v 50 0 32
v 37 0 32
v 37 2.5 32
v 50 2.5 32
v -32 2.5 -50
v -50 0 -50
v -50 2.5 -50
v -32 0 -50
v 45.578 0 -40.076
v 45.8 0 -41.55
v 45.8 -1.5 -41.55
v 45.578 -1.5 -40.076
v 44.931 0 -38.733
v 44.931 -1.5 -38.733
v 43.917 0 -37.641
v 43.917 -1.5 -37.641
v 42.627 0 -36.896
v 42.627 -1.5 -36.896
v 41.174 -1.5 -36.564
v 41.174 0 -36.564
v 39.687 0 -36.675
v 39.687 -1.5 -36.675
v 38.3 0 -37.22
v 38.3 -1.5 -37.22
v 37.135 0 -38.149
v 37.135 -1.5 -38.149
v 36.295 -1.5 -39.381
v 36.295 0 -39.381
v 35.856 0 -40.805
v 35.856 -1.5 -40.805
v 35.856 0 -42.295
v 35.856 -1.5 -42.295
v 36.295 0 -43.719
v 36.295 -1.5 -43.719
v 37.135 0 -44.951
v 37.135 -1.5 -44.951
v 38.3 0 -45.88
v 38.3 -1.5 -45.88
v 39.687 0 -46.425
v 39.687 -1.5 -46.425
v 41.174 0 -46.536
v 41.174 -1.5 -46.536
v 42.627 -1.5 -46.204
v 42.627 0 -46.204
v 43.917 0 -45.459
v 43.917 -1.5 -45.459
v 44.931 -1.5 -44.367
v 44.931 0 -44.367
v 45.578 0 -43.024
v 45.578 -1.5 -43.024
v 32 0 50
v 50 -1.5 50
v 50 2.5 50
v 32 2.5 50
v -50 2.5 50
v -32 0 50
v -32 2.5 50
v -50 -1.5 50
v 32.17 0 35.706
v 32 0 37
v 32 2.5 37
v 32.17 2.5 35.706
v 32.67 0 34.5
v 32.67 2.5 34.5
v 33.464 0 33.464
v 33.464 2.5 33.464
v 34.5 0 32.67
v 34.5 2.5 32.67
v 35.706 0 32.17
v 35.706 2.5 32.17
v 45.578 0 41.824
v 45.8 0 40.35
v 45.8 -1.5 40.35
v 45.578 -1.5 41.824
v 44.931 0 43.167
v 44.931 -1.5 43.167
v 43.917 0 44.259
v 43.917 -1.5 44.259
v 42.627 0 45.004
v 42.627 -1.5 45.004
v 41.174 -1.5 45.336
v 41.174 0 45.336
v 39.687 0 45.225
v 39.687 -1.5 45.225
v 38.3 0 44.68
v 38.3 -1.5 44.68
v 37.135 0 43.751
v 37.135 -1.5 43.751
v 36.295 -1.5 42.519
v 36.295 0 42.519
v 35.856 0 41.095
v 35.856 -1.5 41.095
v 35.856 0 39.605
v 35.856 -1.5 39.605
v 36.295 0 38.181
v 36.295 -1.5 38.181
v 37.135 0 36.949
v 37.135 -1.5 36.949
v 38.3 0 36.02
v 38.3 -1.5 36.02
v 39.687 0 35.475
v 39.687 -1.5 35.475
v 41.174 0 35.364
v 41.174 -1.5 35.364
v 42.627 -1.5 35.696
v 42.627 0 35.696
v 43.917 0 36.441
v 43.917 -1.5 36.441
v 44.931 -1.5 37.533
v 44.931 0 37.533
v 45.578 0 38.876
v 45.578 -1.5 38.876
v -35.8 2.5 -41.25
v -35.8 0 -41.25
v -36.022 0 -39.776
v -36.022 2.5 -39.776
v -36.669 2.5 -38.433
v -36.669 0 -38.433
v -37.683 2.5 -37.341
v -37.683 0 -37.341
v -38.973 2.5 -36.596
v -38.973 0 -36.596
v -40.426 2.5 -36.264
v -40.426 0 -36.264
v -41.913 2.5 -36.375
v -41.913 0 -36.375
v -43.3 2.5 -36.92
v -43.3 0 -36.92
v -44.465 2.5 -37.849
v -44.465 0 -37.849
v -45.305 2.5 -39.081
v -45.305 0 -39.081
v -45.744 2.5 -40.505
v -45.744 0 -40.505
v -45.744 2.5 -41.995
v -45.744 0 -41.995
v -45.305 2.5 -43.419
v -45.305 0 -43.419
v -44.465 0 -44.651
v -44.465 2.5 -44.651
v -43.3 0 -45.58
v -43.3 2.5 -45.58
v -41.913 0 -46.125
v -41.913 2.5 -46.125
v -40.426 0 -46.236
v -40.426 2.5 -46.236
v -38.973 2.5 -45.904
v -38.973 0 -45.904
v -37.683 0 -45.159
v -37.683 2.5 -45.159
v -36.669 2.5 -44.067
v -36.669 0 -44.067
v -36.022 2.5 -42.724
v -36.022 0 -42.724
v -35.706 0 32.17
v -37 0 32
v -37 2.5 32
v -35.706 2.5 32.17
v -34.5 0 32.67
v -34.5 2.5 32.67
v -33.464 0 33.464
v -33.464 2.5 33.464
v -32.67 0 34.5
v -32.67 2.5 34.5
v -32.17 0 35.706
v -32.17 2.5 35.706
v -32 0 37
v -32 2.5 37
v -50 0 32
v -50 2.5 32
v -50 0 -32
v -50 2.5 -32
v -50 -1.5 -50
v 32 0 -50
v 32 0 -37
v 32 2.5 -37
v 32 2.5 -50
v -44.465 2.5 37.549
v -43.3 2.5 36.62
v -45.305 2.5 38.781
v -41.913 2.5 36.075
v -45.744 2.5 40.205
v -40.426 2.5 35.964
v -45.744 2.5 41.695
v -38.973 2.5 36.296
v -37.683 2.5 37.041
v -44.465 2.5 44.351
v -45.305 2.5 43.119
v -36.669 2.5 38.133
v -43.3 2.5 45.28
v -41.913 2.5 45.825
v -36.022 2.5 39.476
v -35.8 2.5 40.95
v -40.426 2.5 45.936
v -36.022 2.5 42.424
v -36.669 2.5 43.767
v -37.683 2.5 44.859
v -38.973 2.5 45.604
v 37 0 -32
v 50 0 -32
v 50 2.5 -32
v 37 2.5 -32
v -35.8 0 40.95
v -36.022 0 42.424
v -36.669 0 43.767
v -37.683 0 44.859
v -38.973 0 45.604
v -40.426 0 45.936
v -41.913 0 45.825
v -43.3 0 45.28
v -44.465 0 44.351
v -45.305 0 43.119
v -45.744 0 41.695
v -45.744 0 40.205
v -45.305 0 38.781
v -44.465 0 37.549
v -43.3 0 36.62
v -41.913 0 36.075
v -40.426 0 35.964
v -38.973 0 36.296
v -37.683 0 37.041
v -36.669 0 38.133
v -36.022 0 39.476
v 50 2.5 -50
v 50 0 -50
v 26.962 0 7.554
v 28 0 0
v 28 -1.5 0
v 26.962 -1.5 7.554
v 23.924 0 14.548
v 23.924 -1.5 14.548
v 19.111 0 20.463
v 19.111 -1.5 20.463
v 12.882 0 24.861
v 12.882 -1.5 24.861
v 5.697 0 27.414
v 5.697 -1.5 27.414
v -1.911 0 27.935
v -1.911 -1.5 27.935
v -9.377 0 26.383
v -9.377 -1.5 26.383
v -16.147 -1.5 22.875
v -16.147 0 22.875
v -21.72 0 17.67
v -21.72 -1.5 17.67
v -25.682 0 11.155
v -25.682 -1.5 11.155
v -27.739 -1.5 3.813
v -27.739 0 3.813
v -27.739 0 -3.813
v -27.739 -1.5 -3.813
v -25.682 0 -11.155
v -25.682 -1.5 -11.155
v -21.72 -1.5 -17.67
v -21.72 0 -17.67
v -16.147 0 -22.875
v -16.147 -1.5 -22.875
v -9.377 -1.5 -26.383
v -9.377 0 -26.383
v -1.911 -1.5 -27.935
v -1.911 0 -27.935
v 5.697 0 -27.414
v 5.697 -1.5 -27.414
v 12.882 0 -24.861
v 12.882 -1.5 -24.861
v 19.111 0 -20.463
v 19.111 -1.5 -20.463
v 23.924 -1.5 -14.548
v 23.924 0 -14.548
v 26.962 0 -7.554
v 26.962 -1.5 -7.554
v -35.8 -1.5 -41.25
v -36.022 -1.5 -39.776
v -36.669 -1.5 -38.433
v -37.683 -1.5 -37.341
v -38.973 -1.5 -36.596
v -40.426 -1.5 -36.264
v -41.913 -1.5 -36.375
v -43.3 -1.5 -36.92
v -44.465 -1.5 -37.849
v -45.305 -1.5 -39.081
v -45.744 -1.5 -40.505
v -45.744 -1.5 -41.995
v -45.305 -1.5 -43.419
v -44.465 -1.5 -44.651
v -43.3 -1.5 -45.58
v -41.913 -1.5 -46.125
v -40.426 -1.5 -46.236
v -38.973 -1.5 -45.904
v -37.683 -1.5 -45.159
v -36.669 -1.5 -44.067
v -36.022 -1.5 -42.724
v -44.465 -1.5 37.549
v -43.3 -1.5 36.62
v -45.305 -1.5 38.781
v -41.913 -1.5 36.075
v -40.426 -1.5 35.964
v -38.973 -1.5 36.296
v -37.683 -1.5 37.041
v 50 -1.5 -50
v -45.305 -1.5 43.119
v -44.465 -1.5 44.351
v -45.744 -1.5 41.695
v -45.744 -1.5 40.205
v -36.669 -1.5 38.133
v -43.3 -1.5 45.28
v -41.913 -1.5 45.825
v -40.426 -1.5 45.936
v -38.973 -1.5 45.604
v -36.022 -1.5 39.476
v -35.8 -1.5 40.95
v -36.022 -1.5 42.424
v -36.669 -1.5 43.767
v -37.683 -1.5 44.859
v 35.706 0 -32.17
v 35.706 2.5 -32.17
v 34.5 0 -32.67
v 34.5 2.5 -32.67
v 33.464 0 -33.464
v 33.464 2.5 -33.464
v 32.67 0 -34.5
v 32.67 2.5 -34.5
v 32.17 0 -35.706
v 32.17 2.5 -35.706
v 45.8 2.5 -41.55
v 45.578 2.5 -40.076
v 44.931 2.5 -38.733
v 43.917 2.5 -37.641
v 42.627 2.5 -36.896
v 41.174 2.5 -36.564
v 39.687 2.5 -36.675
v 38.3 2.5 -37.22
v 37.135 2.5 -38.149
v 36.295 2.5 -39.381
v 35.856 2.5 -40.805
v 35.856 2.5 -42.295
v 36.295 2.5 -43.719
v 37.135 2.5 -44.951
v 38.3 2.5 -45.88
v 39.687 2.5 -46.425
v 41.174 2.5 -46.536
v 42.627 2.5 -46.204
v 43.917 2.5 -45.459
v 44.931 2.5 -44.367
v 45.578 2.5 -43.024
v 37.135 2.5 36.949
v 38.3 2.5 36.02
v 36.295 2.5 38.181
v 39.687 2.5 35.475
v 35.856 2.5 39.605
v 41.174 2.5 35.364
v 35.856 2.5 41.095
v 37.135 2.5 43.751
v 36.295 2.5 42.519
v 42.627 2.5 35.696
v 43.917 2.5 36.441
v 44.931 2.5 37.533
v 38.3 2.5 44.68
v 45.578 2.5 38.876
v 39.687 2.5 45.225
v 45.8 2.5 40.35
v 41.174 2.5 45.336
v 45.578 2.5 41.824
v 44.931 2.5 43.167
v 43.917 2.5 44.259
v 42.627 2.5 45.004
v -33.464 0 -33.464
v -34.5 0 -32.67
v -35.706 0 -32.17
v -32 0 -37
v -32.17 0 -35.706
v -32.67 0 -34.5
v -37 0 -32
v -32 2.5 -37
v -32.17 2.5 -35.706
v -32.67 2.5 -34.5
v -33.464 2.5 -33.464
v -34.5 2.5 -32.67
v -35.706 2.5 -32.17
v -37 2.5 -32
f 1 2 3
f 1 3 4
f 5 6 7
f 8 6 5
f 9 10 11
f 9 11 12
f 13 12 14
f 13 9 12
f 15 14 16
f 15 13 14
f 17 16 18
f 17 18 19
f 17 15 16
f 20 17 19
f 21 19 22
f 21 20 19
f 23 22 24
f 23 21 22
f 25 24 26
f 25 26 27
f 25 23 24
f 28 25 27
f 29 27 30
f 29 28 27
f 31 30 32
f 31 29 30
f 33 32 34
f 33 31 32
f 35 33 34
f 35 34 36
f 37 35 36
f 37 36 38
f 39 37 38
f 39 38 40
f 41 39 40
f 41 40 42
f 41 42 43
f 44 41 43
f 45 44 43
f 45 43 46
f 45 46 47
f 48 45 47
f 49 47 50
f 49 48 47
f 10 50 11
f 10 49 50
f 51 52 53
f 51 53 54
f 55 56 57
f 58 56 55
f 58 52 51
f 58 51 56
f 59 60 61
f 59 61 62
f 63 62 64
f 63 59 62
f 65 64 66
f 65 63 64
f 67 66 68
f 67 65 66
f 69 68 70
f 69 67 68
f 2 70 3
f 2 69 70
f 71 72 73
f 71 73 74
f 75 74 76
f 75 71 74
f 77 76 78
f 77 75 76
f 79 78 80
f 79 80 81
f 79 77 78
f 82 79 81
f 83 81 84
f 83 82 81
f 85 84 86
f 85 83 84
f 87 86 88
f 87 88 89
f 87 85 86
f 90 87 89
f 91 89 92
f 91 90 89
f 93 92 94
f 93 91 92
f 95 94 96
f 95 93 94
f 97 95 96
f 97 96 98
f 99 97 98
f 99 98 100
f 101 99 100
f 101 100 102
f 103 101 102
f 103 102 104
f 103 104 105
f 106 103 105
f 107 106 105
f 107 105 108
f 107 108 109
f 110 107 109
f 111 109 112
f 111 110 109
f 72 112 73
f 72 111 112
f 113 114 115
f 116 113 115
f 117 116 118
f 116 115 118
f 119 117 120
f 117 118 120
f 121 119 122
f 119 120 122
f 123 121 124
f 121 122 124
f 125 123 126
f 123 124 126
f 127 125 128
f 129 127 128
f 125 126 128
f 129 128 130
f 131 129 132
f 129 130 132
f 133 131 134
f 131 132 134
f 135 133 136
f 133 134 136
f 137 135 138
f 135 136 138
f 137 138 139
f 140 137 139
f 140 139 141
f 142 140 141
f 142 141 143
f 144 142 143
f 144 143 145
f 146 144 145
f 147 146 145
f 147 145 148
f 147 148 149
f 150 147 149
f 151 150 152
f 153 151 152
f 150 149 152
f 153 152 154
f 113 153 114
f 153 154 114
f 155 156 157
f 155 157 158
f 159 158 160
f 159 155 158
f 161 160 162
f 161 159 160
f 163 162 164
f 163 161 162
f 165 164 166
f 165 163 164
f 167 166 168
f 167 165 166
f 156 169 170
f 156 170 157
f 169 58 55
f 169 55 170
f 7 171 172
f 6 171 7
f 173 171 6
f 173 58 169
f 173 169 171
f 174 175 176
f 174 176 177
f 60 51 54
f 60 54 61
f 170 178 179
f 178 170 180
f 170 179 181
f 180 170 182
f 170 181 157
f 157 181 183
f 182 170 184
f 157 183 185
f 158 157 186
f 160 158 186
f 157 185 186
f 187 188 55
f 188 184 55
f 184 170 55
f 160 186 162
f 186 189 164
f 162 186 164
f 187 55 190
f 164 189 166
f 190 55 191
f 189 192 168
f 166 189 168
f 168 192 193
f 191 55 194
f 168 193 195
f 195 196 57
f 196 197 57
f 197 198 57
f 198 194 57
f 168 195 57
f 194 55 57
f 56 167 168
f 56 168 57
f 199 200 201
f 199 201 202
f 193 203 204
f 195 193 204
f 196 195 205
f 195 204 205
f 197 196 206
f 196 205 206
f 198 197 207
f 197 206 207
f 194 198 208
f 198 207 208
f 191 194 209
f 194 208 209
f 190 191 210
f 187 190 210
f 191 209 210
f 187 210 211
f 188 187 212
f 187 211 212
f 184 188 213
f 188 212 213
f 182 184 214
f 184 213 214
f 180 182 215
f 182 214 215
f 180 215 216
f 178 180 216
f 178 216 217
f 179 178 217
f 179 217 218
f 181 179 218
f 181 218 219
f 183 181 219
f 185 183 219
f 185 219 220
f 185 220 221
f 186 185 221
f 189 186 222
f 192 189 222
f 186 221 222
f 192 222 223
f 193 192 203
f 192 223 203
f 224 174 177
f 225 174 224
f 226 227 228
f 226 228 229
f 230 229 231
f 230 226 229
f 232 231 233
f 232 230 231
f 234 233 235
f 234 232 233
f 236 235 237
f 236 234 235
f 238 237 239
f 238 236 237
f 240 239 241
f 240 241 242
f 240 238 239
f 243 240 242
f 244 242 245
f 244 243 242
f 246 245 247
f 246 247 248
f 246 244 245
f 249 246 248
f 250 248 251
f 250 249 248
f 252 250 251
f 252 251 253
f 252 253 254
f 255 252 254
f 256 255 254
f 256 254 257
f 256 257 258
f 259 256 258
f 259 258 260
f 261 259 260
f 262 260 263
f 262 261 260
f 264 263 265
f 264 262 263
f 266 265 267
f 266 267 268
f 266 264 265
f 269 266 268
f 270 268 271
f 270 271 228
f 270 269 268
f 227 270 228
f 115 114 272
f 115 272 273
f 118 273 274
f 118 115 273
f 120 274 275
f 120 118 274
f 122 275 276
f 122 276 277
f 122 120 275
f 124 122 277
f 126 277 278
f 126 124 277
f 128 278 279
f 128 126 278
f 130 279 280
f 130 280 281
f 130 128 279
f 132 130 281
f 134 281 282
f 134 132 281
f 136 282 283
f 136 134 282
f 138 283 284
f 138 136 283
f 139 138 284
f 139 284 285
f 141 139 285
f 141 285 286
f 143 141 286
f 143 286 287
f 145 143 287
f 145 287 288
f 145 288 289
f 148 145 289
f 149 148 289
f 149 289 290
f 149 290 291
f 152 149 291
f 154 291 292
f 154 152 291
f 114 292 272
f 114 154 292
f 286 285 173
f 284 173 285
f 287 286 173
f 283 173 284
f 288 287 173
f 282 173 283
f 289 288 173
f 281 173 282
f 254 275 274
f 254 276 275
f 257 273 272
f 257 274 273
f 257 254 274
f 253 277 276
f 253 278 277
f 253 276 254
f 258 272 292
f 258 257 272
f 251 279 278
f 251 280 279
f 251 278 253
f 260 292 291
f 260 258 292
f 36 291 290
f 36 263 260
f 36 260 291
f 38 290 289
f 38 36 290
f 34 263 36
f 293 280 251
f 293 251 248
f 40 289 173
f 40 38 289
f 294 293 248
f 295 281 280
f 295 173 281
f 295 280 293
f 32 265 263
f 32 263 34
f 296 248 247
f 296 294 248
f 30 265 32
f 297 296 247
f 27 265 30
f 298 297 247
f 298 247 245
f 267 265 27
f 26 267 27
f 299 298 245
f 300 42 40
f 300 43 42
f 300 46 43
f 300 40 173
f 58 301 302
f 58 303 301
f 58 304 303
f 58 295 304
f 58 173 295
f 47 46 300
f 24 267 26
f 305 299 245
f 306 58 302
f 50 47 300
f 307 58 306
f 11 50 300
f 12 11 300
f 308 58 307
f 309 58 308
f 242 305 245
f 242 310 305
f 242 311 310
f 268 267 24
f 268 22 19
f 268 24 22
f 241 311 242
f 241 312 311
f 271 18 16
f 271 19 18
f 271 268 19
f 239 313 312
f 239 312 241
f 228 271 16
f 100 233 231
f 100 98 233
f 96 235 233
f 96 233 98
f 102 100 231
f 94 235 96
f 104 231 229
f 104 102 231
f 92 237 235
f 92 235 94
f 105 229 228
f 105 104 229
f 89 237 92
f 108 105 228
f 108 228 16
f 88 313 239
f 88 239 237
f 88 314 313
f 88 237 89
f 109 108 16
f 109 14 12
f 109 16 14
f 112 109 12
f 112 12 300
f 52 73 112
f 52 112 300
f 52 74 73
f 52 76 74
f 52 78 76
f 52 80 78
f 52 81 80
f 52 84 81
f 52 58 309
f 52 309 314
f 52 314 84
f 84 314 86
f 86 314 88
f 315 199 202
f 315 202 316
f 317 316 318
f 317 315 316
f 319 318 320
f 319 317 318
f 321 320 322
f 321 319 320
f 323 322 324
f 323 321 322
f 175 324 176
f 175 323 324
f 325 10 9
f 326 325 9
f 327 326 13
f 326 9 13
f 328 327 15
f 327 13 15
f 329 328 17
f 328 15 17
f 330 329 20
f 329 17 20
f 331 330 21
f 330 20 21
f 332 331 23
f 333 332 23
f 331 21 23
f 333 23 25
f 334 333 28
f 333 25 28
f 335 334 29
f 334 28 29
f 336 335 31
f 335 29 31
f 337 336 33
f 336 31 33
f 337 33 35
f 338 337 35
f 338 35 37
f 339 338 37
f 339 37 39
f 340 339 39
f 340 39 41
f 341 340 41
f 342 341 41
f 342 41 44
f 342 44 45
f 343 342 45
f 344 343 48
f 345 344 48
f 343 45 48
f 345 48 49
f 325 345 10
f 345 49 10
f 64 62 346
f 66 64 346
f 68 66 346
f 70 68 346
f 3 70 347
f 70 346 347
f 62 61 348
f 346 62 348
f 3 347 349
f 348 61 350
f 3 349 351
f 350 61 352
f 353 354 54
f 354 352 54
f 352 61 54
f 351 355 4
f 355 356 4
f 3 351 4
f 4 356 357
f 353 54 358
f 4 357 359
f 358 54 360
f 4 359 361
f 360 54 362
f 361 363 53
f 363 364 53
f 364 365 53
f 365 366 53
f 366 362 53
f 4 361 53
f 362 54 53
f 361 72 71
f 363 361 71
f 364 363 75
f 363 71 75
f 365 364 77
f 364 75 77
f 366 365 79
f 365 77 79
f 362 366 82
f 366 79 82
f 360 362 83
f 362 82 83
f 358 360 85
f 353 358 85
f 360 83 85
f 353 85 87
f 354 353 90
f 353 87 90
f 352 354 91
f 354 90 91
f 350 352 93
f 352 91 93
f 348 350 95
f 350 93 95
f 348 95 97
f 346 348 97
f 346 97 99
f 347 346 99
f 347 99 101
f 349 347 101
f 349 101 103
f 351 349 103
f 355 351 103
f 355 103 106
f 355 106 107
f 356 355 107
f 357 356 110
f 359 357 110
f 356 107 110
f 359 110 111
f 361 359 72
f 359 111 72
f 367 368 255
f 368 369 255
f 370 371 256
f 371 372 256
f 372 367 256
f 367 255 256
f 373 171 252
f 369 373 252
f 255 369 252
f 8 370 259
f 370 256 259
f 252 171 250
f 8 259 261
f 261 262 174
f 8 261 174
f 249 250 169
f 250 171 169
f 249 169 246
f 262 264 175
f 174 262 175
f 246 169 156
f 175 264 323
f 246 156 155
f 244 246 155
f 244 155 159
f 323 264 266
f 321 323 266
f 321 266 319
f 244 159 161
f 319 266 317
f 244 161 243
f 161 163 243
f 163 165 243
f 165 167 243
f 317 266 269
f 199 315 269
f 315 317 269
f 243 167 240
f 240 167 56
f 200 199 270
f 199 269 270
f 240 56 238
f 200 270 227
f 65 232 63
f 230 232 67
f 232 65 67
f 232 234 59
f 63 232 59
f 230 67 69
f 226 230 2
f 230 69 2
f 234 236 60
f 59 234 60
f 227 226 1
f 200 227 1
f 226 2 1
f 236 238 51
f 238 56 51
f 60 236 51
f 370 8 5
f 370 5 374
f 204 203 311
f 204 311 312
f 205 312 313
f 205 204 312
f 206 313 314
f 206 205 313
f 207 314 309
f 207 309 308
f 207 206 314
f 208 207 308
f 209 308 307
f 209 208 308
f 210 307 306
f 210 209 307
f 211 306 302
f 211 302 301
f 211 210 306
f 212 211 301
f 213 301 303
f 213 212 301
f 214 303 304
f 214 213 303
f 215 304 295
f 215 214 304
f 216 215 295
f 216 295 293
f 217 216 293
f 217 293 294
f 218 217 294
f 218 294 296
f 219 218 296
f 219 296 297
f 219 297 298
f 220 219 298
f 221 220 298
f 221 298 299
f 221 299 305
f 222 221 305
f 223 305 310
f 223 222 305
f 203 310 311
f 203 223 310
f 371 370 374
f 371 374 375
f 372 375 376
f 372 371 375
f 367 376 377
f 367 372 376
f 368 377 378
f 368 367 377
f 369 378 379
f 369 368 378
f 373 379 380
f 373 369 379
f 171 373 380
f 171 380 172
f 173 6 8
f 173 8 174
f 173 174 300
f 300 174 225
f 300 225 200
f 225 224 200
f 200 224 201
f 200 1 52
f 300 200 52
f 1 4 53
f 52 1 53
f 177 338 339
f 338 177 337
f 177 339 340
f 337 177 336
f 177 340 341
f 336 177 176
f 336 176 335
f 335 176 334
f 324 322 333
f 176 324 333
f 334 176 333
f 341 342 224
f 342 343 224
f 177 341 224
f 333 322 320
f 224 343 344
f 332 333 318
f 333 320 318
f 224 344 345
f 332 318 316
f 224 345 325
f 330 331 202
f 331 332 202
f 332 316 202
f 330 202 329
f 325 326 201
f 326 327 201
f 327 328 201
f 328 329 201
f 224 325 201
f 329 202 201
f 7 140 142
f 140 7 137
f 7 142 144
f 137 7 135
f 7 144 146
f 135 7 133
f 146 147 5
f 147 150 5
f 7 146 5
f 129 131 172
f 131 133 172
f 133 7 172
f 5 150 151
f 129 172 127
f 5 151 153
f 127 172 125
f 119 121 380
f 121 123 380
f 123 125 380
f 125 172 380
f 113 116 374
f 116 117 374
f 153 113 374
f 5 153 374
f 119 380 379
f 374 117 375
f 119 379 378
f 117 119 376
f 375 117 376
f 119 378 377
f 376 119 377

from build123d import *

# Parameters (mm, degrees)
F0_R     = 5
F0_R_2   = 28
F1_DEPTH = 1.5
F2_DEPTH = 2.5


with BuildPart() as f1:
    # F0 (on Front) → F1 (new body)
    with BuildSketch(Plane.XZ):
        with BuildLine():
            Line((-32, 50), (-50, 50))
            Line((-50, 50), (-50, 32))
            Line((-50, 32), (-37, 32))
            ThreePointArc((-37, 32), (-33.464466, 33.464466), (-32, 37))
            Line((-32, 37), (-32, 50))
        make_face()
        with Locations((-40.800001, 40.95)):
            Circle(F0_R, mode=Mode.SUBTRACT)
        with BuildLine():
            Line((50, 50), (32, 50))
            Line((32, 50), (32, 37))
            ThreePointArc((32, 37), (33.464466, 33.464466), (37, 32))
            Line((37, 32), (50, 32))
            Line((50, 32), (50, 50))
        make_face()
        with Locations((40.800005, 40.350001)):
            Circle(F0_R, mode=Mode.SUBTRACT)
        with BuildLine():
            Line((50, -50), (50, -32))
            Line((50, -32), (37, -32))
            ThreePointArc((37, -32), (33.464466, -33.464466), (32, -37))
            Line((32, -37), (32, -50))
            Line((32, -50), (50, -50))
        make_face()
        with Locations((40.800005, -41.550003)):
            Circle(F0_R, mode=Mode.SUBTRACT)
        with BuildLine():
            Line((-37, -32), (-50, -32))
            Line((-50, -32), (-50, -50))
            Line((-50, -50), (-32, -50))
            Line((-32, -50), (-32, -37))
            ThreePointArc((-32, -37), (-33.464466, -33.464466), (-37, -32))
        make_face()
        with Locations((-40.800001, -41.250005)):
            Circle(F0_R, mode=Mode.SUBTRACT)
        with BuildLine():
            Line((32, 50), (-32, 50))
            Line((-32, 50), (-32, 37))
            ThreePointArc((-32, 37), (-33.464466, 33.464466), (-37, 32))
            Line((-37, 32), (-50, 32))
            Line((-50, 32), (-50, -32))
            Line((-50, -32), (-37, -32))
            ThreePointArc((-37, -32), (-33.464466, -33.464466), (-32, -37))
            Line((-32, -37), (-32, -50))
            Line((-32, -50), (32, -50))
            Line((32, -50), (32, -37))
            ThreePointArc((32, -37), (33.464466, -33.464466), (37, -32))
            Line((37, -32), (50, -32))
            Line((50, -32), (50, 32))
            Line((50, 32), (37, 32))
            ThreePointArc((37, 32), (33.464466, 33.464466), (32, 37))
            Line((32, 37), (32, 50))
        make_face()
        Circle(F0_R_2, mode=Mode.SUBTRACT)
    extrude(amount=F1_DEPTH)

    # F0 (on Front) → F2 (join)
    with BuildSketch(Plane.XZ):
        with BuildLine():
            Line((-32, 50), (-50, 50))
            Line((-50, 50), (-50, 32))
            Line((-50, 32), (-37, 32))
            ThreePointArc((-37, 32), (-33.464466, 33.464466), (-32, 37))
            Line((-32, 37), (-32, 50))
        make_face()
        with Locations((-40.800001, 40.95)):
            Circle(F0_R, mode=Mode.SUBTRACT)
        with BuildLine():
            Line((50, 50), (32, 50))
            Line((32, 50), (32, 37))
            ThreePointArc((32, 37), (33.464466, 33.464466), (37, 32))
            Line((37, 32), (50, 32))
            Line((50, 32), (50, 50))
        make_face()
        with Locations((40.800005, 40.350001)):
            Circle(F0_R, mode=Mode.SUBTRACT)
        with BuildLine():
            Line((-37, -32), (-50, -32))
            Line((-50, -32), (-50, -50))
            Line((-50, -50), (-32, -50))
            Line((-32, -50), (-32, -37))
            ThreePointArc((-32, -37), (-33.464466, -33.464466), (-37, -32))
        make_face()
        with Locations((-40.800001, -41.250005)):
            Circle(F0_R, mode=Mode.SUBTRACT)
        with BuildLine():
            Line((50, -50), (50, -32))
            Line((50, -32), (37, -32))
            ThreePointArc((37, -32), (33.464466, -33.464466), (32, -37))
            Line((32, -37), (32, -50))
            Line((32, -50), (50, -50))
        make_face()
        with Locations((40.800005, -41.550003)):
            Circle(F0_R, mode=Mode.SUBTRACT)
    extrude(amount=-F2_DEPTH)


solid = f1.part
